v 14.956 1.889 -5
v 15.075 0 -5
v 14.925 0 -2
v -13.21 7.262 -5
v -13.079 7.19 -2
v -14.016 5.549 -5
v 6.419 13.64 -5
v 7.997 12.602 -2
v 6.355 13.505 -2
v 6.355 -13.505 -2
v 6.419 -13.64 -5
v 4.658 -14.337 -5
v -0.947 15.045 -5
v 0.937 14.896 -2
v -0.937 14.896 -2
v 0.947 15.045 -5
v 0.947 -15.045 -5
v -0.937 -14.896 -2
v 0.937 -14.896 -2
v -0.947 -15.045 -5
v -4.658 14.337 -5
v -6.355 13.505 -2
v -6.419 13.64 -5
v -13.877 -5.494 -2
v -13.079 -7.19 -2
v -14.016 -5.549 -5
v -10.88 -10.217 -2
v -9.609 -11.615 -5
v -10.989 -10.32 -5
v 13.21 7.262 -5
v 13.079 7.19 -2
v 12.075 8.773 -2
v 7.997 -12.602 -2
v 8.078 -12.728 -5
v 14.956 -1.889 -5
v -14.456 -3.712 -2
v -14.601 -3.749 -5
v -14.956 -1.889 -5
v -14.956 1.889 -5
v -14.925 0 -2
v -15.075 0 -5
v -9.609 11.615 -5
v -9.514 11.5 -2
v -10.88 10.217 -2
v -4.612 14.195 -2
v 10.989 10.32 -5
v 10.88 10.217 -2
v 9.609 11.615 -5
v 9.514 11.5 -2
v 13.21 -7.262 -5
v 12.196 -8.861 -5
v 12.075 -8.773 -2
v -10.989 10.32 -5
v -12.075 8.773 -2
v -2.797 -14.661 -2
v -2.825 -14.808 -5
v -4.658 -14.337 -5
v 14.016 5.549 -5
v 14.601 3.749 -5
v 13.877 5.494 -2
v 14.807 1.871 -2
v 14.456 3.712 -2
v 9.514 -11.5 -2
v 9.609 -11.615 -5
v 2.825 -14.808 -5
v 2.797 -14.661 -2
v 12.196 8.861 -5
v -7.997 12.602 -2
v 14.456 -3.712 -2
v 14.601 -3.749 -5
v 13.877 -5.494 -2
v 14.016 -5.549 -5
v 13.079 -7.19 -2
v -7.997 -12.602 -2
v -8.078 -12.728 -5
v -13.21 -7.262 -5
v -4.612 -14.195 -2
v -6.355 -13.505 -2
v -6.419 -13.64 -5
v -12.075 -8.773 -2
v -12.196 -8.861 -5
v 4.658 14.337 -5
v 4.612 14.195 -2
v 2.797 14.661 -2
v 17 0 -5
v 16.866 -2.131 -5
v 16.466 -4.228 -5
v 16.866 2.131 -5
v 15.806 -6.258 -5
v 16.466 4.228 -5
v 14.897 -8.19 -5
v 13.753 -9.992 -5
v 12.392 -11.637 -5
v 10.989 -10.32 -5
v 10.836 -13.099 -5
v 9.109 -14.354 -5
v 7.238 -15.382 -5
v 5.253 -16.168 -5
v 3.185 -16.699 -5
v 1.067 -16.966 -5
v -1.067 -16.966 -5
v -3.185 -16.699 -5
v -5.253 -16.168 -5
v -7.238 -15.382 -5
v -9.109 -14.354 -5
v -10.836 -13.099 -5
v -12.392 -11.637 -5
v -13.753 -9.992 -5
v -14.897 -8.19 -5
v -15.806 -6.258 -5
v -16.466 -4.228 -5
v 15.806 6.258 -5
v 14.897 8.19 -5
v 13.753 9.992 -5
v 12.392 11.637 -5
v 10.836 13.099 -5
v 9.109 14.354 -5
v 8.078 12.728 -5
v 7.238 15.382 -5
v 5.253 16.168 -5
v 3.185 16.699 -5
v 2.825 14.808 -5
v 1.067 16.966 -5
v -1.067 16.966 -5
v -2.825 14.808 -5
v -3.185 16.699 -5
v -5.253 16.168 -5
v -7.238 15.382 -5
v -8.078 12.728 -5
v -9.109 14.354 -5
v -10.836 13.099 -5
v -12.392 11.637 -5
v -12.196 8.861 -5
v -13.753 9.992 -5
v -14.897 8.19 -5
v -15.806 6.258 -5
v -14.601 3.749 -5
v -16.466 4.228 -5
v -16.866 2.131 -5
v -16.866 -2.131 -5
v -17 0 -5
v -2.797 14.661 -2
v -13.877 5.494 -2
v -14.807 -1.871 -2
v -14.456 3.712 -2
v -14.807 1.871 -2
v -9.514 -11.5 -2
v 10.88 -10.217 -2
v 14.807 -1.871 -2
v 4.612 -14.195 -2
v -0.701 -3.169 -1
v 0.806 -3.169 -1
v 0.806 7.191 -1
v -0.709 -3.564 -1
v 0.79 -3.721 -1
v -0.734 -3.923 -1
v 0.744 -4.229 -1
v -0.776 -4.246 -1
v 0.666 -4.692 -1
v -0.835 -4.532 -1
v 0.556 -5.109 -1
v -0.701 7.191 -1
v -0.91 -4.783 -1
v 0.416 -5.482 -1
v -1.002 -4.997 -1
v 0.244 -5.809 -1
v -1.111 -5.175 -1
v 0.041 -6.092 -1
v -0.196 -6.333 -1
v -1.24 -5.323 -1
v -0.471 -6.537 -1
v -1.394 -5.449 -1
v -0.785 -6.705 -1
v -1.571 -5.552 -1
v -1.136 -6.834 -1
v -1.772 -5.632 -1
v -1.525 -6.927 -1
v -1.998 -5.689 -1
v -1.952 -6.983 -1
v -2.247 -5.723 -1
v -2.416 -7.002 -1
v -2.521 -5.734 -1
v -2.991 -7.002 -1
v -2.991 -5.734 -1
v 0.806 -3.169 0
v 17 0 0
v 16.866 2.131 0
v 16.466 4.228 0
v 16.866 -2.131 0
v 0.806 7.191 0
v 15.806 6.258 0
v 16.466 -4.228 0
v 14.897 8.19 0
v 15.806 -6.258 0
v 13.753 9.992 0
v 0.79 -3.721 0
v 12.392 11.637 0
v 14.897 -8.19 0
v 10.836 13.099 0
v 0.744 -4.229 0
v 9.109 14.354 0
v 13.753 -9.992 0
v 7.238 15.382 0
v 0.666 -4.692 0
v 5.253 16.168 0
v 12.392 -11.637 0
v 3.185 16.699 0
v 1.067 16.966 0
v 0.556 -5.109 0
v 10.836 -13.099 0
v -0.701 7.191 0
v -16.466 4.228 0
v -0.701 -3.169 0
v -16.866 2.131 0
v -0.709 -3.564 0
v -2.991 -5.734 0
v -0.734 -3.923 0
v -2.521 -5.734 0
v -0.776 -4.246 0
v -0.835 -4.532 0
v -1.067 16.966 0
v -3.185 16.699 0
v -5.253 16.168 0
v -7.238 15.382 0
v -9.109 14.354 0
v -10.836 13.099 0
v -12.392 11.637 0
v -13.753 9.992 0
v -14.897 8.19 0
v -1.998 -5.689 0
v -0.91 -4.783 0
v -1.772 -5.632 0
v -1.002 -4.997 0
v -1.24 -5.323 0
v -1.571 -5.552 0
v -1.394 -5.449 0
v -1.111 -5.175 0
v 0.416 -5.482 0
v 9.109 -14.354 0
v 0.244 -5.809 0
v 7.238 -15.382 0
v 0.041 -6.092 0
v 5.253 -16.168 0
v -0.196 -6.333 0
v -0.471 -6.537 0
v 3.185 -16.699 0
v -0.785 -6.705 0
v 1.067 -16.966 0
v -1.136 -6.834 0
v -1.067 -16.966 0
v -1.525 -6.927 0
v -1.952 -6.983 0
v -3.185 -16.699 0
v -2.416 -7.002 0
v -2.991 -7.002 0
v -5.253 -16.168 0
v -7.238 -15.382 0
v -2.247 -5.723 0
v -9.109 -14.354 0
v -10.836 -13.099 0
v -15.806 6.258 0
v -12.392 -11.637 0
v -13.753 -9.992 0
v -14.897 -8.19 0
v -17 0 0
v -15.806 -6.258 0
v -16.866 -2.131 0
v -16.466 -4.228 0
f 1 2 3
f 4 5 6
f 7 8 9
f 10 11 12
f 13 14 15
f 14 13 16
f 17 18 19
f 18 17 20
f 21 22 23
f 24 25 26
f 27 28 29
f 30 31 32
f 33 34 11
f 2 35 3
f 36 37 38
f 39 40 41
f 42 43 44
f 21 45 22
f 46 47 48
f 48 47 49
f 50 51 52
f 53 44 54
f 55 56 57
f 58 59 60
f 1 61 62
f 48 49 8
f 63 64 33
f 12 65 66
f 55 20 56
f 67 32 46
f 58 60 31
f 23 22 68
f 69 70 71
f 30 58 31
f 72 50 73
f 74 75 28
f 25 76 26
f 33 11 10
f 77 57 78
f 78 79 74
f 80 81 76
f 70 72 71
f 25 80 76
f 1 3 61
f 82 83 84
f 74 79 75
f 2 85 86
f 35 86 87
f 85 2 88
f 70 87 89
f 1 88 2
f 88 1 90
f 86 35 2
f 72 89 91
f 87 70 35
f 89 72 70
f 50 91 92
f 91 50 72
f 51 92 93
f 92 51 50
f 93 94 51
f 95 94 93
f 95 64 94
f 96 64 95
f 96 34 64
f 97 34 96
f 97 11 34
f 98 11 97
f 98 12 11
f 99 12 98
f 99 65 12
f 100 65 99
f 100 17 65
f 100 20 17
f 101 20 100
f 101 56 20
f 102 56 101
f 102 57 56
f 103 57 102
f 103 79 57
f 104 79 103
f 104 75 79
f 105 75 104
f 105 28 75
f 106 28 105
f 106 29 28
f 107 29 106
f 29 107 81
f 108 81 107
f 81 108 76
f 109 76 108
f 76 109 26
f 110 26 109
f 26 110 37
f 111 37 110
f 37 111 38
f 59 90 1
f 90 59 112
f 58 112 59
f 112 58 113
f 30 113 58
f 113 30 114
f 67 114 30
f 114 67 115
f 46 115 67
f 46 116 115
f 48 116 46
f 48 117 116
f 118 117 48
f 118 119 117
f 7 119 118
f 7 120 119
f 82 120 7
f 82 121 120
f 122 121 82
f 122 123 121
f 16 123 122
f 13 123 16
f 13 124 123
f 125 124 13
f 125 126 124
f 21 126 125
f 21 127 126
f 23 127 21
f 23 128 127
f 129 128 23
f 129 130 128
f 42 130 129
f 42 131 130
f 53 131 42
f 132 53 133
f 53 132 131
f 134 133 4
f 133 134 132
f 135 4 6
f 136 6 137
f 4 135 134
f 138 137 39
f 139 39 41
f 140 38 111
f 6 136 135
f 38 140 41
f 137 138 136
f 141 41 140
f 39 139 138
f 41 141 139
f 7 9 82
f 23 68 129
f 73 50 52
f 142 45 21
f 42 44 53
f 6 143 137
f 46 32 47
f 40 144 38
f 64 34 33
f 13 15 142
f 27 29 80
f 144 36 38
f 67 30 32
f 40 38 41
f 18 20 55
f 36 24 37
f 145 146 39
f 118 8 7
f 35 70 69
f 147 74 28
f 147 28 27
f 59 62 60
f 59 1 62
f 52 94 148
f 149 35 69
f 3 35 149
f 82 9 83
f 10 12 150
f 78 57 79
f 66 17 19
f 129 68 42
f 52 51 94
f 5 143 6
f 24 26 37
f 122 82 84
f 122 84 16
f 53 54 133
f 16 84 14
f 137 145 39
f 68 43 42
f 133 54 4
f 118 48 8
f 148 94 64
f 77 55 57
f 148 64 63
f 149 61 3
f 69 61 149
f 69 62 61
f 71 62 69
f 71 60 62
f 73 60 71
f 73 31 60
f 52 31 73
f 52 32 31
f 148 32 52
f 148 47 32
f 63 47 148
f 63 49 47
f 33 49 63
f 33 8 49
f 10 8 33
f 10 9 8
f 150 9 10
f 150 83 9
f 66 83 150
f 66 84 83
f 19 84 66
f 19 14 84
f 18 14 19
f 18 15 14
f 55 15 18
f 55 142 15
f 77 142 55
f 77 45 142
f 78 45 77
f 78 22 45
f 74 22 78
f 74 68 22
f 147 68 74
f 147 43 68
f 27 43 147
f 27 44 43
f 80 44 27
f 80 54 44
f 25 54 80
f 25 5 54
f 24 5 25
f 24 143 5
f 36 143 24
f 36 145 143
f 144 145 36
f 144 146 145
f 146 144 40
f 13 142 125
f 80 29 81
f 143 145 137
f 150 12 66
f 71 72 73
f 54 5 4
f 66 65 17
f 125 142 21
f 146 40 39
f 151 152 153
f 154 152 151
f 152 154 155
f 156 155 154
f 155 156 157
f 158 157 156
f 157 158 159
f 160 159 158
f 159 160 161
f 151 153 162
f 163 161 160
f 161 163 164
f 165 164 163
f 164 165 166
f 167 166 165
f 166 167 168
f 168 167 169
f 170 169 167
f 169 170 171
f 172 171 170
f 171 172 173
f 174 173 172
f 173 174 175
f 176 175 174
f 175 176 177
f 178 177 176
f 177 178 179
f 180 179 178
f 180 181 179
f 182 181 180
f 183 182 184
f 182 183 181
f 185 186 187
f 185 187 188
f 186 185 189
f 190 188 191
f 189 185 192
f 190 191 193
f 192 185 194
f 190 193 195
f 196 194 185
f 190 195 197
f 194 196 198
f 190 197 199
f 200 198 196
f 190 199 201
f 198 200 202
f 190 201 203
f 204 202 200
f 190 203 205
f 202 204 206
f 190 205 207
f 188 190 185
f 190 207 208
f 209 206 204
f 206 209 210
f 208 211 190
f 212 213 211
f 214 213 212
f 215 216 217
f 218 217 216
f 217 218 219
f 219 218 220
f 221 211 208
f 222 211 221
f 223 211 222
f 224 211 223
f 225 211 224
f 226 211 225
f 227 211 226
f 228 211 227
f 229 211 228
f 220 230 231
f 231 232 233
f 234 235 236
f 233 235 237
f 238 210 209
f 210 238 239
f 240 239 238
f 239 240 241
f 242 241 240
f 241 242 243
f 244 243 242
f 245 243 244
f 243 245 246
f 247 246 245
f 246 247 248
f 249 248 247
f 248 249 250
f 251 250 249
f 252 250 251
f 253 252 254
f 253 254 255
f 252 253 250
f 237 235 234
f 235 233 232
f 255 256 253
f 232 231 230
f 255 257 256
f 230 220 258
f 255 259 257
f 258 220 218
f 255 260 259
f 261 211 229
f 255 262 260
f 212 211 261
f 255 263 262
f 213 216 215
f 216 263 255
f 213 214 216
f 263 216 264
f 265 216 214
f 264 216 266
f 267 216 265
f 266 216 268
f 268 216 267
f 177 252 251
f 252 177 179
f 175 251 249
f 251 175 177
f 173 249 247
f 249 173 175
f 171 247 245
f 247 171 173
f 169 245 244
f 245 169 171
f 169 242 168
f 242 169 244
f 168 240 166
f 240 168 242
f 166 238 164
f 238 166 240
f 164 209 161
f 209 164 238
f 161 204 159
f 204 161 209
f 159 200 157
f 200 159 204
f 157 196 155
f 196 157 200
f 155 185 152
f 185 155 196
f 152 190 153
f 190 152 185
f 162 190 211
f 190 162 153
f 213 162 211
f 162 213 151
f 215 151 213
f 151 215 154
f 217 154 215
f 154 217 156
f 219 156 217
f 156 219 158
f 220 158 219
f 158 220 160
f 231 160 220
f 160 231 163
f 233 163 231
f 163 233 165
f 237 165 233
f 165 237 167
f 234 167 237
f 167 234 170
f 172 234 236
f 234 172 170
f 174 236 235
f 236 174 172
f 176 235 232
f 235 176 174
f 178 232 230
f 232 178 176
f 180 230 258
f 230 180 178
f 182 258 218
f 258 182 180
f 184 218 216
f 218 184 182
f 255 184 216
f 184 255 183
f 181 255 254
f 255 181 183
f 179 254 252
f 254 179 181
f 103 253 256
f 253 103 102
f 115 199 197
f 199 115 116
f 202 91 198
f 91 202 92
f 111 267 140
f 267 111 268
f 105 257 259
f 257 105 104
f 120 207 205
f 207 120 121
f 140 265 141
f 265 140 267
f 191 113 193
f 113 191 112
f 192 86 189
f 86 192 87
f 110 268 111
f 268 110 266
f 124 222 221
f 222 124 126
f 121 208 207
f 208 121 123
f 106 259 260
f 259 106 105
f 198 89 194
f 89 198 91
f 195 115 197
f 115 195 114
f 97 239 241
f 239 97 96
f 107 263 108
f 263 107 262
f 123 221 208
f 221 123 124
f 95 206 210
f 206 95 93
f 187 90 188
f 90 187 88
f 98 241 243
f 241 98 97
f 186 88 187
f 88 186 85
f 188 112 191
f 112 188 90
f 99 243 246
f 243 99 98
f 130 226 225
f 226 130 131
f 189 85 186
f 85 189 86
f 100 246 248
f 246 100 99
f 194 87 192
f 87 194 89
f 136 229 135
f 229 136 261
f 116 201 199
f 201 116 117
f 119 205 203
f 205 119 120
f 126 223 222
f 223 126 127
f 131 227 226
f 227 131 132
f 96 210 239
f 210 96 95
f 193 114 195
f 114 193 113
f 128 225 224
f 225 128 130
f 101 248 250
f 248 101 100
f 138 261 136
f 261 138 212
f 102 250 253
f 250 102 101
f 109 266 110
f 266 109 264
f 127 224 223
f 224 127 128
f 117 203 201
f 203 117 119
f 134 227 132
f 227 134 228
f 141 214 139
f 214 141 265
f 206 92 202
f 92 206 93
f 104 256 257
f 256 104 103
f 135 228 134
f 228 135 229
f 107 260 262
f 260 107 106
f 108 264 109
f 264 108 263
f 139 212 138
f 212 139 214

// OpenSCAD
$fn = 50;


difference() {
	union() {
		translate(v = [0, 0, -5.0000000000]) {
			cylinder(h = 5, r = 17.0000000000);
		}
	}
	union() {
		#translate(v = [0, 0, -5.0000000000]) {
			cylinder(h = 3, r1 = 15.0750000000, r2 = 14.9250000000);
		}
		translate(v = [0, 0, -1]) {
			linear_extrude(height = 1) {
				text(font = "Wingdings", halign = "center", size = 11, text = "J", valign = "center");
			}
		}
	}
}
